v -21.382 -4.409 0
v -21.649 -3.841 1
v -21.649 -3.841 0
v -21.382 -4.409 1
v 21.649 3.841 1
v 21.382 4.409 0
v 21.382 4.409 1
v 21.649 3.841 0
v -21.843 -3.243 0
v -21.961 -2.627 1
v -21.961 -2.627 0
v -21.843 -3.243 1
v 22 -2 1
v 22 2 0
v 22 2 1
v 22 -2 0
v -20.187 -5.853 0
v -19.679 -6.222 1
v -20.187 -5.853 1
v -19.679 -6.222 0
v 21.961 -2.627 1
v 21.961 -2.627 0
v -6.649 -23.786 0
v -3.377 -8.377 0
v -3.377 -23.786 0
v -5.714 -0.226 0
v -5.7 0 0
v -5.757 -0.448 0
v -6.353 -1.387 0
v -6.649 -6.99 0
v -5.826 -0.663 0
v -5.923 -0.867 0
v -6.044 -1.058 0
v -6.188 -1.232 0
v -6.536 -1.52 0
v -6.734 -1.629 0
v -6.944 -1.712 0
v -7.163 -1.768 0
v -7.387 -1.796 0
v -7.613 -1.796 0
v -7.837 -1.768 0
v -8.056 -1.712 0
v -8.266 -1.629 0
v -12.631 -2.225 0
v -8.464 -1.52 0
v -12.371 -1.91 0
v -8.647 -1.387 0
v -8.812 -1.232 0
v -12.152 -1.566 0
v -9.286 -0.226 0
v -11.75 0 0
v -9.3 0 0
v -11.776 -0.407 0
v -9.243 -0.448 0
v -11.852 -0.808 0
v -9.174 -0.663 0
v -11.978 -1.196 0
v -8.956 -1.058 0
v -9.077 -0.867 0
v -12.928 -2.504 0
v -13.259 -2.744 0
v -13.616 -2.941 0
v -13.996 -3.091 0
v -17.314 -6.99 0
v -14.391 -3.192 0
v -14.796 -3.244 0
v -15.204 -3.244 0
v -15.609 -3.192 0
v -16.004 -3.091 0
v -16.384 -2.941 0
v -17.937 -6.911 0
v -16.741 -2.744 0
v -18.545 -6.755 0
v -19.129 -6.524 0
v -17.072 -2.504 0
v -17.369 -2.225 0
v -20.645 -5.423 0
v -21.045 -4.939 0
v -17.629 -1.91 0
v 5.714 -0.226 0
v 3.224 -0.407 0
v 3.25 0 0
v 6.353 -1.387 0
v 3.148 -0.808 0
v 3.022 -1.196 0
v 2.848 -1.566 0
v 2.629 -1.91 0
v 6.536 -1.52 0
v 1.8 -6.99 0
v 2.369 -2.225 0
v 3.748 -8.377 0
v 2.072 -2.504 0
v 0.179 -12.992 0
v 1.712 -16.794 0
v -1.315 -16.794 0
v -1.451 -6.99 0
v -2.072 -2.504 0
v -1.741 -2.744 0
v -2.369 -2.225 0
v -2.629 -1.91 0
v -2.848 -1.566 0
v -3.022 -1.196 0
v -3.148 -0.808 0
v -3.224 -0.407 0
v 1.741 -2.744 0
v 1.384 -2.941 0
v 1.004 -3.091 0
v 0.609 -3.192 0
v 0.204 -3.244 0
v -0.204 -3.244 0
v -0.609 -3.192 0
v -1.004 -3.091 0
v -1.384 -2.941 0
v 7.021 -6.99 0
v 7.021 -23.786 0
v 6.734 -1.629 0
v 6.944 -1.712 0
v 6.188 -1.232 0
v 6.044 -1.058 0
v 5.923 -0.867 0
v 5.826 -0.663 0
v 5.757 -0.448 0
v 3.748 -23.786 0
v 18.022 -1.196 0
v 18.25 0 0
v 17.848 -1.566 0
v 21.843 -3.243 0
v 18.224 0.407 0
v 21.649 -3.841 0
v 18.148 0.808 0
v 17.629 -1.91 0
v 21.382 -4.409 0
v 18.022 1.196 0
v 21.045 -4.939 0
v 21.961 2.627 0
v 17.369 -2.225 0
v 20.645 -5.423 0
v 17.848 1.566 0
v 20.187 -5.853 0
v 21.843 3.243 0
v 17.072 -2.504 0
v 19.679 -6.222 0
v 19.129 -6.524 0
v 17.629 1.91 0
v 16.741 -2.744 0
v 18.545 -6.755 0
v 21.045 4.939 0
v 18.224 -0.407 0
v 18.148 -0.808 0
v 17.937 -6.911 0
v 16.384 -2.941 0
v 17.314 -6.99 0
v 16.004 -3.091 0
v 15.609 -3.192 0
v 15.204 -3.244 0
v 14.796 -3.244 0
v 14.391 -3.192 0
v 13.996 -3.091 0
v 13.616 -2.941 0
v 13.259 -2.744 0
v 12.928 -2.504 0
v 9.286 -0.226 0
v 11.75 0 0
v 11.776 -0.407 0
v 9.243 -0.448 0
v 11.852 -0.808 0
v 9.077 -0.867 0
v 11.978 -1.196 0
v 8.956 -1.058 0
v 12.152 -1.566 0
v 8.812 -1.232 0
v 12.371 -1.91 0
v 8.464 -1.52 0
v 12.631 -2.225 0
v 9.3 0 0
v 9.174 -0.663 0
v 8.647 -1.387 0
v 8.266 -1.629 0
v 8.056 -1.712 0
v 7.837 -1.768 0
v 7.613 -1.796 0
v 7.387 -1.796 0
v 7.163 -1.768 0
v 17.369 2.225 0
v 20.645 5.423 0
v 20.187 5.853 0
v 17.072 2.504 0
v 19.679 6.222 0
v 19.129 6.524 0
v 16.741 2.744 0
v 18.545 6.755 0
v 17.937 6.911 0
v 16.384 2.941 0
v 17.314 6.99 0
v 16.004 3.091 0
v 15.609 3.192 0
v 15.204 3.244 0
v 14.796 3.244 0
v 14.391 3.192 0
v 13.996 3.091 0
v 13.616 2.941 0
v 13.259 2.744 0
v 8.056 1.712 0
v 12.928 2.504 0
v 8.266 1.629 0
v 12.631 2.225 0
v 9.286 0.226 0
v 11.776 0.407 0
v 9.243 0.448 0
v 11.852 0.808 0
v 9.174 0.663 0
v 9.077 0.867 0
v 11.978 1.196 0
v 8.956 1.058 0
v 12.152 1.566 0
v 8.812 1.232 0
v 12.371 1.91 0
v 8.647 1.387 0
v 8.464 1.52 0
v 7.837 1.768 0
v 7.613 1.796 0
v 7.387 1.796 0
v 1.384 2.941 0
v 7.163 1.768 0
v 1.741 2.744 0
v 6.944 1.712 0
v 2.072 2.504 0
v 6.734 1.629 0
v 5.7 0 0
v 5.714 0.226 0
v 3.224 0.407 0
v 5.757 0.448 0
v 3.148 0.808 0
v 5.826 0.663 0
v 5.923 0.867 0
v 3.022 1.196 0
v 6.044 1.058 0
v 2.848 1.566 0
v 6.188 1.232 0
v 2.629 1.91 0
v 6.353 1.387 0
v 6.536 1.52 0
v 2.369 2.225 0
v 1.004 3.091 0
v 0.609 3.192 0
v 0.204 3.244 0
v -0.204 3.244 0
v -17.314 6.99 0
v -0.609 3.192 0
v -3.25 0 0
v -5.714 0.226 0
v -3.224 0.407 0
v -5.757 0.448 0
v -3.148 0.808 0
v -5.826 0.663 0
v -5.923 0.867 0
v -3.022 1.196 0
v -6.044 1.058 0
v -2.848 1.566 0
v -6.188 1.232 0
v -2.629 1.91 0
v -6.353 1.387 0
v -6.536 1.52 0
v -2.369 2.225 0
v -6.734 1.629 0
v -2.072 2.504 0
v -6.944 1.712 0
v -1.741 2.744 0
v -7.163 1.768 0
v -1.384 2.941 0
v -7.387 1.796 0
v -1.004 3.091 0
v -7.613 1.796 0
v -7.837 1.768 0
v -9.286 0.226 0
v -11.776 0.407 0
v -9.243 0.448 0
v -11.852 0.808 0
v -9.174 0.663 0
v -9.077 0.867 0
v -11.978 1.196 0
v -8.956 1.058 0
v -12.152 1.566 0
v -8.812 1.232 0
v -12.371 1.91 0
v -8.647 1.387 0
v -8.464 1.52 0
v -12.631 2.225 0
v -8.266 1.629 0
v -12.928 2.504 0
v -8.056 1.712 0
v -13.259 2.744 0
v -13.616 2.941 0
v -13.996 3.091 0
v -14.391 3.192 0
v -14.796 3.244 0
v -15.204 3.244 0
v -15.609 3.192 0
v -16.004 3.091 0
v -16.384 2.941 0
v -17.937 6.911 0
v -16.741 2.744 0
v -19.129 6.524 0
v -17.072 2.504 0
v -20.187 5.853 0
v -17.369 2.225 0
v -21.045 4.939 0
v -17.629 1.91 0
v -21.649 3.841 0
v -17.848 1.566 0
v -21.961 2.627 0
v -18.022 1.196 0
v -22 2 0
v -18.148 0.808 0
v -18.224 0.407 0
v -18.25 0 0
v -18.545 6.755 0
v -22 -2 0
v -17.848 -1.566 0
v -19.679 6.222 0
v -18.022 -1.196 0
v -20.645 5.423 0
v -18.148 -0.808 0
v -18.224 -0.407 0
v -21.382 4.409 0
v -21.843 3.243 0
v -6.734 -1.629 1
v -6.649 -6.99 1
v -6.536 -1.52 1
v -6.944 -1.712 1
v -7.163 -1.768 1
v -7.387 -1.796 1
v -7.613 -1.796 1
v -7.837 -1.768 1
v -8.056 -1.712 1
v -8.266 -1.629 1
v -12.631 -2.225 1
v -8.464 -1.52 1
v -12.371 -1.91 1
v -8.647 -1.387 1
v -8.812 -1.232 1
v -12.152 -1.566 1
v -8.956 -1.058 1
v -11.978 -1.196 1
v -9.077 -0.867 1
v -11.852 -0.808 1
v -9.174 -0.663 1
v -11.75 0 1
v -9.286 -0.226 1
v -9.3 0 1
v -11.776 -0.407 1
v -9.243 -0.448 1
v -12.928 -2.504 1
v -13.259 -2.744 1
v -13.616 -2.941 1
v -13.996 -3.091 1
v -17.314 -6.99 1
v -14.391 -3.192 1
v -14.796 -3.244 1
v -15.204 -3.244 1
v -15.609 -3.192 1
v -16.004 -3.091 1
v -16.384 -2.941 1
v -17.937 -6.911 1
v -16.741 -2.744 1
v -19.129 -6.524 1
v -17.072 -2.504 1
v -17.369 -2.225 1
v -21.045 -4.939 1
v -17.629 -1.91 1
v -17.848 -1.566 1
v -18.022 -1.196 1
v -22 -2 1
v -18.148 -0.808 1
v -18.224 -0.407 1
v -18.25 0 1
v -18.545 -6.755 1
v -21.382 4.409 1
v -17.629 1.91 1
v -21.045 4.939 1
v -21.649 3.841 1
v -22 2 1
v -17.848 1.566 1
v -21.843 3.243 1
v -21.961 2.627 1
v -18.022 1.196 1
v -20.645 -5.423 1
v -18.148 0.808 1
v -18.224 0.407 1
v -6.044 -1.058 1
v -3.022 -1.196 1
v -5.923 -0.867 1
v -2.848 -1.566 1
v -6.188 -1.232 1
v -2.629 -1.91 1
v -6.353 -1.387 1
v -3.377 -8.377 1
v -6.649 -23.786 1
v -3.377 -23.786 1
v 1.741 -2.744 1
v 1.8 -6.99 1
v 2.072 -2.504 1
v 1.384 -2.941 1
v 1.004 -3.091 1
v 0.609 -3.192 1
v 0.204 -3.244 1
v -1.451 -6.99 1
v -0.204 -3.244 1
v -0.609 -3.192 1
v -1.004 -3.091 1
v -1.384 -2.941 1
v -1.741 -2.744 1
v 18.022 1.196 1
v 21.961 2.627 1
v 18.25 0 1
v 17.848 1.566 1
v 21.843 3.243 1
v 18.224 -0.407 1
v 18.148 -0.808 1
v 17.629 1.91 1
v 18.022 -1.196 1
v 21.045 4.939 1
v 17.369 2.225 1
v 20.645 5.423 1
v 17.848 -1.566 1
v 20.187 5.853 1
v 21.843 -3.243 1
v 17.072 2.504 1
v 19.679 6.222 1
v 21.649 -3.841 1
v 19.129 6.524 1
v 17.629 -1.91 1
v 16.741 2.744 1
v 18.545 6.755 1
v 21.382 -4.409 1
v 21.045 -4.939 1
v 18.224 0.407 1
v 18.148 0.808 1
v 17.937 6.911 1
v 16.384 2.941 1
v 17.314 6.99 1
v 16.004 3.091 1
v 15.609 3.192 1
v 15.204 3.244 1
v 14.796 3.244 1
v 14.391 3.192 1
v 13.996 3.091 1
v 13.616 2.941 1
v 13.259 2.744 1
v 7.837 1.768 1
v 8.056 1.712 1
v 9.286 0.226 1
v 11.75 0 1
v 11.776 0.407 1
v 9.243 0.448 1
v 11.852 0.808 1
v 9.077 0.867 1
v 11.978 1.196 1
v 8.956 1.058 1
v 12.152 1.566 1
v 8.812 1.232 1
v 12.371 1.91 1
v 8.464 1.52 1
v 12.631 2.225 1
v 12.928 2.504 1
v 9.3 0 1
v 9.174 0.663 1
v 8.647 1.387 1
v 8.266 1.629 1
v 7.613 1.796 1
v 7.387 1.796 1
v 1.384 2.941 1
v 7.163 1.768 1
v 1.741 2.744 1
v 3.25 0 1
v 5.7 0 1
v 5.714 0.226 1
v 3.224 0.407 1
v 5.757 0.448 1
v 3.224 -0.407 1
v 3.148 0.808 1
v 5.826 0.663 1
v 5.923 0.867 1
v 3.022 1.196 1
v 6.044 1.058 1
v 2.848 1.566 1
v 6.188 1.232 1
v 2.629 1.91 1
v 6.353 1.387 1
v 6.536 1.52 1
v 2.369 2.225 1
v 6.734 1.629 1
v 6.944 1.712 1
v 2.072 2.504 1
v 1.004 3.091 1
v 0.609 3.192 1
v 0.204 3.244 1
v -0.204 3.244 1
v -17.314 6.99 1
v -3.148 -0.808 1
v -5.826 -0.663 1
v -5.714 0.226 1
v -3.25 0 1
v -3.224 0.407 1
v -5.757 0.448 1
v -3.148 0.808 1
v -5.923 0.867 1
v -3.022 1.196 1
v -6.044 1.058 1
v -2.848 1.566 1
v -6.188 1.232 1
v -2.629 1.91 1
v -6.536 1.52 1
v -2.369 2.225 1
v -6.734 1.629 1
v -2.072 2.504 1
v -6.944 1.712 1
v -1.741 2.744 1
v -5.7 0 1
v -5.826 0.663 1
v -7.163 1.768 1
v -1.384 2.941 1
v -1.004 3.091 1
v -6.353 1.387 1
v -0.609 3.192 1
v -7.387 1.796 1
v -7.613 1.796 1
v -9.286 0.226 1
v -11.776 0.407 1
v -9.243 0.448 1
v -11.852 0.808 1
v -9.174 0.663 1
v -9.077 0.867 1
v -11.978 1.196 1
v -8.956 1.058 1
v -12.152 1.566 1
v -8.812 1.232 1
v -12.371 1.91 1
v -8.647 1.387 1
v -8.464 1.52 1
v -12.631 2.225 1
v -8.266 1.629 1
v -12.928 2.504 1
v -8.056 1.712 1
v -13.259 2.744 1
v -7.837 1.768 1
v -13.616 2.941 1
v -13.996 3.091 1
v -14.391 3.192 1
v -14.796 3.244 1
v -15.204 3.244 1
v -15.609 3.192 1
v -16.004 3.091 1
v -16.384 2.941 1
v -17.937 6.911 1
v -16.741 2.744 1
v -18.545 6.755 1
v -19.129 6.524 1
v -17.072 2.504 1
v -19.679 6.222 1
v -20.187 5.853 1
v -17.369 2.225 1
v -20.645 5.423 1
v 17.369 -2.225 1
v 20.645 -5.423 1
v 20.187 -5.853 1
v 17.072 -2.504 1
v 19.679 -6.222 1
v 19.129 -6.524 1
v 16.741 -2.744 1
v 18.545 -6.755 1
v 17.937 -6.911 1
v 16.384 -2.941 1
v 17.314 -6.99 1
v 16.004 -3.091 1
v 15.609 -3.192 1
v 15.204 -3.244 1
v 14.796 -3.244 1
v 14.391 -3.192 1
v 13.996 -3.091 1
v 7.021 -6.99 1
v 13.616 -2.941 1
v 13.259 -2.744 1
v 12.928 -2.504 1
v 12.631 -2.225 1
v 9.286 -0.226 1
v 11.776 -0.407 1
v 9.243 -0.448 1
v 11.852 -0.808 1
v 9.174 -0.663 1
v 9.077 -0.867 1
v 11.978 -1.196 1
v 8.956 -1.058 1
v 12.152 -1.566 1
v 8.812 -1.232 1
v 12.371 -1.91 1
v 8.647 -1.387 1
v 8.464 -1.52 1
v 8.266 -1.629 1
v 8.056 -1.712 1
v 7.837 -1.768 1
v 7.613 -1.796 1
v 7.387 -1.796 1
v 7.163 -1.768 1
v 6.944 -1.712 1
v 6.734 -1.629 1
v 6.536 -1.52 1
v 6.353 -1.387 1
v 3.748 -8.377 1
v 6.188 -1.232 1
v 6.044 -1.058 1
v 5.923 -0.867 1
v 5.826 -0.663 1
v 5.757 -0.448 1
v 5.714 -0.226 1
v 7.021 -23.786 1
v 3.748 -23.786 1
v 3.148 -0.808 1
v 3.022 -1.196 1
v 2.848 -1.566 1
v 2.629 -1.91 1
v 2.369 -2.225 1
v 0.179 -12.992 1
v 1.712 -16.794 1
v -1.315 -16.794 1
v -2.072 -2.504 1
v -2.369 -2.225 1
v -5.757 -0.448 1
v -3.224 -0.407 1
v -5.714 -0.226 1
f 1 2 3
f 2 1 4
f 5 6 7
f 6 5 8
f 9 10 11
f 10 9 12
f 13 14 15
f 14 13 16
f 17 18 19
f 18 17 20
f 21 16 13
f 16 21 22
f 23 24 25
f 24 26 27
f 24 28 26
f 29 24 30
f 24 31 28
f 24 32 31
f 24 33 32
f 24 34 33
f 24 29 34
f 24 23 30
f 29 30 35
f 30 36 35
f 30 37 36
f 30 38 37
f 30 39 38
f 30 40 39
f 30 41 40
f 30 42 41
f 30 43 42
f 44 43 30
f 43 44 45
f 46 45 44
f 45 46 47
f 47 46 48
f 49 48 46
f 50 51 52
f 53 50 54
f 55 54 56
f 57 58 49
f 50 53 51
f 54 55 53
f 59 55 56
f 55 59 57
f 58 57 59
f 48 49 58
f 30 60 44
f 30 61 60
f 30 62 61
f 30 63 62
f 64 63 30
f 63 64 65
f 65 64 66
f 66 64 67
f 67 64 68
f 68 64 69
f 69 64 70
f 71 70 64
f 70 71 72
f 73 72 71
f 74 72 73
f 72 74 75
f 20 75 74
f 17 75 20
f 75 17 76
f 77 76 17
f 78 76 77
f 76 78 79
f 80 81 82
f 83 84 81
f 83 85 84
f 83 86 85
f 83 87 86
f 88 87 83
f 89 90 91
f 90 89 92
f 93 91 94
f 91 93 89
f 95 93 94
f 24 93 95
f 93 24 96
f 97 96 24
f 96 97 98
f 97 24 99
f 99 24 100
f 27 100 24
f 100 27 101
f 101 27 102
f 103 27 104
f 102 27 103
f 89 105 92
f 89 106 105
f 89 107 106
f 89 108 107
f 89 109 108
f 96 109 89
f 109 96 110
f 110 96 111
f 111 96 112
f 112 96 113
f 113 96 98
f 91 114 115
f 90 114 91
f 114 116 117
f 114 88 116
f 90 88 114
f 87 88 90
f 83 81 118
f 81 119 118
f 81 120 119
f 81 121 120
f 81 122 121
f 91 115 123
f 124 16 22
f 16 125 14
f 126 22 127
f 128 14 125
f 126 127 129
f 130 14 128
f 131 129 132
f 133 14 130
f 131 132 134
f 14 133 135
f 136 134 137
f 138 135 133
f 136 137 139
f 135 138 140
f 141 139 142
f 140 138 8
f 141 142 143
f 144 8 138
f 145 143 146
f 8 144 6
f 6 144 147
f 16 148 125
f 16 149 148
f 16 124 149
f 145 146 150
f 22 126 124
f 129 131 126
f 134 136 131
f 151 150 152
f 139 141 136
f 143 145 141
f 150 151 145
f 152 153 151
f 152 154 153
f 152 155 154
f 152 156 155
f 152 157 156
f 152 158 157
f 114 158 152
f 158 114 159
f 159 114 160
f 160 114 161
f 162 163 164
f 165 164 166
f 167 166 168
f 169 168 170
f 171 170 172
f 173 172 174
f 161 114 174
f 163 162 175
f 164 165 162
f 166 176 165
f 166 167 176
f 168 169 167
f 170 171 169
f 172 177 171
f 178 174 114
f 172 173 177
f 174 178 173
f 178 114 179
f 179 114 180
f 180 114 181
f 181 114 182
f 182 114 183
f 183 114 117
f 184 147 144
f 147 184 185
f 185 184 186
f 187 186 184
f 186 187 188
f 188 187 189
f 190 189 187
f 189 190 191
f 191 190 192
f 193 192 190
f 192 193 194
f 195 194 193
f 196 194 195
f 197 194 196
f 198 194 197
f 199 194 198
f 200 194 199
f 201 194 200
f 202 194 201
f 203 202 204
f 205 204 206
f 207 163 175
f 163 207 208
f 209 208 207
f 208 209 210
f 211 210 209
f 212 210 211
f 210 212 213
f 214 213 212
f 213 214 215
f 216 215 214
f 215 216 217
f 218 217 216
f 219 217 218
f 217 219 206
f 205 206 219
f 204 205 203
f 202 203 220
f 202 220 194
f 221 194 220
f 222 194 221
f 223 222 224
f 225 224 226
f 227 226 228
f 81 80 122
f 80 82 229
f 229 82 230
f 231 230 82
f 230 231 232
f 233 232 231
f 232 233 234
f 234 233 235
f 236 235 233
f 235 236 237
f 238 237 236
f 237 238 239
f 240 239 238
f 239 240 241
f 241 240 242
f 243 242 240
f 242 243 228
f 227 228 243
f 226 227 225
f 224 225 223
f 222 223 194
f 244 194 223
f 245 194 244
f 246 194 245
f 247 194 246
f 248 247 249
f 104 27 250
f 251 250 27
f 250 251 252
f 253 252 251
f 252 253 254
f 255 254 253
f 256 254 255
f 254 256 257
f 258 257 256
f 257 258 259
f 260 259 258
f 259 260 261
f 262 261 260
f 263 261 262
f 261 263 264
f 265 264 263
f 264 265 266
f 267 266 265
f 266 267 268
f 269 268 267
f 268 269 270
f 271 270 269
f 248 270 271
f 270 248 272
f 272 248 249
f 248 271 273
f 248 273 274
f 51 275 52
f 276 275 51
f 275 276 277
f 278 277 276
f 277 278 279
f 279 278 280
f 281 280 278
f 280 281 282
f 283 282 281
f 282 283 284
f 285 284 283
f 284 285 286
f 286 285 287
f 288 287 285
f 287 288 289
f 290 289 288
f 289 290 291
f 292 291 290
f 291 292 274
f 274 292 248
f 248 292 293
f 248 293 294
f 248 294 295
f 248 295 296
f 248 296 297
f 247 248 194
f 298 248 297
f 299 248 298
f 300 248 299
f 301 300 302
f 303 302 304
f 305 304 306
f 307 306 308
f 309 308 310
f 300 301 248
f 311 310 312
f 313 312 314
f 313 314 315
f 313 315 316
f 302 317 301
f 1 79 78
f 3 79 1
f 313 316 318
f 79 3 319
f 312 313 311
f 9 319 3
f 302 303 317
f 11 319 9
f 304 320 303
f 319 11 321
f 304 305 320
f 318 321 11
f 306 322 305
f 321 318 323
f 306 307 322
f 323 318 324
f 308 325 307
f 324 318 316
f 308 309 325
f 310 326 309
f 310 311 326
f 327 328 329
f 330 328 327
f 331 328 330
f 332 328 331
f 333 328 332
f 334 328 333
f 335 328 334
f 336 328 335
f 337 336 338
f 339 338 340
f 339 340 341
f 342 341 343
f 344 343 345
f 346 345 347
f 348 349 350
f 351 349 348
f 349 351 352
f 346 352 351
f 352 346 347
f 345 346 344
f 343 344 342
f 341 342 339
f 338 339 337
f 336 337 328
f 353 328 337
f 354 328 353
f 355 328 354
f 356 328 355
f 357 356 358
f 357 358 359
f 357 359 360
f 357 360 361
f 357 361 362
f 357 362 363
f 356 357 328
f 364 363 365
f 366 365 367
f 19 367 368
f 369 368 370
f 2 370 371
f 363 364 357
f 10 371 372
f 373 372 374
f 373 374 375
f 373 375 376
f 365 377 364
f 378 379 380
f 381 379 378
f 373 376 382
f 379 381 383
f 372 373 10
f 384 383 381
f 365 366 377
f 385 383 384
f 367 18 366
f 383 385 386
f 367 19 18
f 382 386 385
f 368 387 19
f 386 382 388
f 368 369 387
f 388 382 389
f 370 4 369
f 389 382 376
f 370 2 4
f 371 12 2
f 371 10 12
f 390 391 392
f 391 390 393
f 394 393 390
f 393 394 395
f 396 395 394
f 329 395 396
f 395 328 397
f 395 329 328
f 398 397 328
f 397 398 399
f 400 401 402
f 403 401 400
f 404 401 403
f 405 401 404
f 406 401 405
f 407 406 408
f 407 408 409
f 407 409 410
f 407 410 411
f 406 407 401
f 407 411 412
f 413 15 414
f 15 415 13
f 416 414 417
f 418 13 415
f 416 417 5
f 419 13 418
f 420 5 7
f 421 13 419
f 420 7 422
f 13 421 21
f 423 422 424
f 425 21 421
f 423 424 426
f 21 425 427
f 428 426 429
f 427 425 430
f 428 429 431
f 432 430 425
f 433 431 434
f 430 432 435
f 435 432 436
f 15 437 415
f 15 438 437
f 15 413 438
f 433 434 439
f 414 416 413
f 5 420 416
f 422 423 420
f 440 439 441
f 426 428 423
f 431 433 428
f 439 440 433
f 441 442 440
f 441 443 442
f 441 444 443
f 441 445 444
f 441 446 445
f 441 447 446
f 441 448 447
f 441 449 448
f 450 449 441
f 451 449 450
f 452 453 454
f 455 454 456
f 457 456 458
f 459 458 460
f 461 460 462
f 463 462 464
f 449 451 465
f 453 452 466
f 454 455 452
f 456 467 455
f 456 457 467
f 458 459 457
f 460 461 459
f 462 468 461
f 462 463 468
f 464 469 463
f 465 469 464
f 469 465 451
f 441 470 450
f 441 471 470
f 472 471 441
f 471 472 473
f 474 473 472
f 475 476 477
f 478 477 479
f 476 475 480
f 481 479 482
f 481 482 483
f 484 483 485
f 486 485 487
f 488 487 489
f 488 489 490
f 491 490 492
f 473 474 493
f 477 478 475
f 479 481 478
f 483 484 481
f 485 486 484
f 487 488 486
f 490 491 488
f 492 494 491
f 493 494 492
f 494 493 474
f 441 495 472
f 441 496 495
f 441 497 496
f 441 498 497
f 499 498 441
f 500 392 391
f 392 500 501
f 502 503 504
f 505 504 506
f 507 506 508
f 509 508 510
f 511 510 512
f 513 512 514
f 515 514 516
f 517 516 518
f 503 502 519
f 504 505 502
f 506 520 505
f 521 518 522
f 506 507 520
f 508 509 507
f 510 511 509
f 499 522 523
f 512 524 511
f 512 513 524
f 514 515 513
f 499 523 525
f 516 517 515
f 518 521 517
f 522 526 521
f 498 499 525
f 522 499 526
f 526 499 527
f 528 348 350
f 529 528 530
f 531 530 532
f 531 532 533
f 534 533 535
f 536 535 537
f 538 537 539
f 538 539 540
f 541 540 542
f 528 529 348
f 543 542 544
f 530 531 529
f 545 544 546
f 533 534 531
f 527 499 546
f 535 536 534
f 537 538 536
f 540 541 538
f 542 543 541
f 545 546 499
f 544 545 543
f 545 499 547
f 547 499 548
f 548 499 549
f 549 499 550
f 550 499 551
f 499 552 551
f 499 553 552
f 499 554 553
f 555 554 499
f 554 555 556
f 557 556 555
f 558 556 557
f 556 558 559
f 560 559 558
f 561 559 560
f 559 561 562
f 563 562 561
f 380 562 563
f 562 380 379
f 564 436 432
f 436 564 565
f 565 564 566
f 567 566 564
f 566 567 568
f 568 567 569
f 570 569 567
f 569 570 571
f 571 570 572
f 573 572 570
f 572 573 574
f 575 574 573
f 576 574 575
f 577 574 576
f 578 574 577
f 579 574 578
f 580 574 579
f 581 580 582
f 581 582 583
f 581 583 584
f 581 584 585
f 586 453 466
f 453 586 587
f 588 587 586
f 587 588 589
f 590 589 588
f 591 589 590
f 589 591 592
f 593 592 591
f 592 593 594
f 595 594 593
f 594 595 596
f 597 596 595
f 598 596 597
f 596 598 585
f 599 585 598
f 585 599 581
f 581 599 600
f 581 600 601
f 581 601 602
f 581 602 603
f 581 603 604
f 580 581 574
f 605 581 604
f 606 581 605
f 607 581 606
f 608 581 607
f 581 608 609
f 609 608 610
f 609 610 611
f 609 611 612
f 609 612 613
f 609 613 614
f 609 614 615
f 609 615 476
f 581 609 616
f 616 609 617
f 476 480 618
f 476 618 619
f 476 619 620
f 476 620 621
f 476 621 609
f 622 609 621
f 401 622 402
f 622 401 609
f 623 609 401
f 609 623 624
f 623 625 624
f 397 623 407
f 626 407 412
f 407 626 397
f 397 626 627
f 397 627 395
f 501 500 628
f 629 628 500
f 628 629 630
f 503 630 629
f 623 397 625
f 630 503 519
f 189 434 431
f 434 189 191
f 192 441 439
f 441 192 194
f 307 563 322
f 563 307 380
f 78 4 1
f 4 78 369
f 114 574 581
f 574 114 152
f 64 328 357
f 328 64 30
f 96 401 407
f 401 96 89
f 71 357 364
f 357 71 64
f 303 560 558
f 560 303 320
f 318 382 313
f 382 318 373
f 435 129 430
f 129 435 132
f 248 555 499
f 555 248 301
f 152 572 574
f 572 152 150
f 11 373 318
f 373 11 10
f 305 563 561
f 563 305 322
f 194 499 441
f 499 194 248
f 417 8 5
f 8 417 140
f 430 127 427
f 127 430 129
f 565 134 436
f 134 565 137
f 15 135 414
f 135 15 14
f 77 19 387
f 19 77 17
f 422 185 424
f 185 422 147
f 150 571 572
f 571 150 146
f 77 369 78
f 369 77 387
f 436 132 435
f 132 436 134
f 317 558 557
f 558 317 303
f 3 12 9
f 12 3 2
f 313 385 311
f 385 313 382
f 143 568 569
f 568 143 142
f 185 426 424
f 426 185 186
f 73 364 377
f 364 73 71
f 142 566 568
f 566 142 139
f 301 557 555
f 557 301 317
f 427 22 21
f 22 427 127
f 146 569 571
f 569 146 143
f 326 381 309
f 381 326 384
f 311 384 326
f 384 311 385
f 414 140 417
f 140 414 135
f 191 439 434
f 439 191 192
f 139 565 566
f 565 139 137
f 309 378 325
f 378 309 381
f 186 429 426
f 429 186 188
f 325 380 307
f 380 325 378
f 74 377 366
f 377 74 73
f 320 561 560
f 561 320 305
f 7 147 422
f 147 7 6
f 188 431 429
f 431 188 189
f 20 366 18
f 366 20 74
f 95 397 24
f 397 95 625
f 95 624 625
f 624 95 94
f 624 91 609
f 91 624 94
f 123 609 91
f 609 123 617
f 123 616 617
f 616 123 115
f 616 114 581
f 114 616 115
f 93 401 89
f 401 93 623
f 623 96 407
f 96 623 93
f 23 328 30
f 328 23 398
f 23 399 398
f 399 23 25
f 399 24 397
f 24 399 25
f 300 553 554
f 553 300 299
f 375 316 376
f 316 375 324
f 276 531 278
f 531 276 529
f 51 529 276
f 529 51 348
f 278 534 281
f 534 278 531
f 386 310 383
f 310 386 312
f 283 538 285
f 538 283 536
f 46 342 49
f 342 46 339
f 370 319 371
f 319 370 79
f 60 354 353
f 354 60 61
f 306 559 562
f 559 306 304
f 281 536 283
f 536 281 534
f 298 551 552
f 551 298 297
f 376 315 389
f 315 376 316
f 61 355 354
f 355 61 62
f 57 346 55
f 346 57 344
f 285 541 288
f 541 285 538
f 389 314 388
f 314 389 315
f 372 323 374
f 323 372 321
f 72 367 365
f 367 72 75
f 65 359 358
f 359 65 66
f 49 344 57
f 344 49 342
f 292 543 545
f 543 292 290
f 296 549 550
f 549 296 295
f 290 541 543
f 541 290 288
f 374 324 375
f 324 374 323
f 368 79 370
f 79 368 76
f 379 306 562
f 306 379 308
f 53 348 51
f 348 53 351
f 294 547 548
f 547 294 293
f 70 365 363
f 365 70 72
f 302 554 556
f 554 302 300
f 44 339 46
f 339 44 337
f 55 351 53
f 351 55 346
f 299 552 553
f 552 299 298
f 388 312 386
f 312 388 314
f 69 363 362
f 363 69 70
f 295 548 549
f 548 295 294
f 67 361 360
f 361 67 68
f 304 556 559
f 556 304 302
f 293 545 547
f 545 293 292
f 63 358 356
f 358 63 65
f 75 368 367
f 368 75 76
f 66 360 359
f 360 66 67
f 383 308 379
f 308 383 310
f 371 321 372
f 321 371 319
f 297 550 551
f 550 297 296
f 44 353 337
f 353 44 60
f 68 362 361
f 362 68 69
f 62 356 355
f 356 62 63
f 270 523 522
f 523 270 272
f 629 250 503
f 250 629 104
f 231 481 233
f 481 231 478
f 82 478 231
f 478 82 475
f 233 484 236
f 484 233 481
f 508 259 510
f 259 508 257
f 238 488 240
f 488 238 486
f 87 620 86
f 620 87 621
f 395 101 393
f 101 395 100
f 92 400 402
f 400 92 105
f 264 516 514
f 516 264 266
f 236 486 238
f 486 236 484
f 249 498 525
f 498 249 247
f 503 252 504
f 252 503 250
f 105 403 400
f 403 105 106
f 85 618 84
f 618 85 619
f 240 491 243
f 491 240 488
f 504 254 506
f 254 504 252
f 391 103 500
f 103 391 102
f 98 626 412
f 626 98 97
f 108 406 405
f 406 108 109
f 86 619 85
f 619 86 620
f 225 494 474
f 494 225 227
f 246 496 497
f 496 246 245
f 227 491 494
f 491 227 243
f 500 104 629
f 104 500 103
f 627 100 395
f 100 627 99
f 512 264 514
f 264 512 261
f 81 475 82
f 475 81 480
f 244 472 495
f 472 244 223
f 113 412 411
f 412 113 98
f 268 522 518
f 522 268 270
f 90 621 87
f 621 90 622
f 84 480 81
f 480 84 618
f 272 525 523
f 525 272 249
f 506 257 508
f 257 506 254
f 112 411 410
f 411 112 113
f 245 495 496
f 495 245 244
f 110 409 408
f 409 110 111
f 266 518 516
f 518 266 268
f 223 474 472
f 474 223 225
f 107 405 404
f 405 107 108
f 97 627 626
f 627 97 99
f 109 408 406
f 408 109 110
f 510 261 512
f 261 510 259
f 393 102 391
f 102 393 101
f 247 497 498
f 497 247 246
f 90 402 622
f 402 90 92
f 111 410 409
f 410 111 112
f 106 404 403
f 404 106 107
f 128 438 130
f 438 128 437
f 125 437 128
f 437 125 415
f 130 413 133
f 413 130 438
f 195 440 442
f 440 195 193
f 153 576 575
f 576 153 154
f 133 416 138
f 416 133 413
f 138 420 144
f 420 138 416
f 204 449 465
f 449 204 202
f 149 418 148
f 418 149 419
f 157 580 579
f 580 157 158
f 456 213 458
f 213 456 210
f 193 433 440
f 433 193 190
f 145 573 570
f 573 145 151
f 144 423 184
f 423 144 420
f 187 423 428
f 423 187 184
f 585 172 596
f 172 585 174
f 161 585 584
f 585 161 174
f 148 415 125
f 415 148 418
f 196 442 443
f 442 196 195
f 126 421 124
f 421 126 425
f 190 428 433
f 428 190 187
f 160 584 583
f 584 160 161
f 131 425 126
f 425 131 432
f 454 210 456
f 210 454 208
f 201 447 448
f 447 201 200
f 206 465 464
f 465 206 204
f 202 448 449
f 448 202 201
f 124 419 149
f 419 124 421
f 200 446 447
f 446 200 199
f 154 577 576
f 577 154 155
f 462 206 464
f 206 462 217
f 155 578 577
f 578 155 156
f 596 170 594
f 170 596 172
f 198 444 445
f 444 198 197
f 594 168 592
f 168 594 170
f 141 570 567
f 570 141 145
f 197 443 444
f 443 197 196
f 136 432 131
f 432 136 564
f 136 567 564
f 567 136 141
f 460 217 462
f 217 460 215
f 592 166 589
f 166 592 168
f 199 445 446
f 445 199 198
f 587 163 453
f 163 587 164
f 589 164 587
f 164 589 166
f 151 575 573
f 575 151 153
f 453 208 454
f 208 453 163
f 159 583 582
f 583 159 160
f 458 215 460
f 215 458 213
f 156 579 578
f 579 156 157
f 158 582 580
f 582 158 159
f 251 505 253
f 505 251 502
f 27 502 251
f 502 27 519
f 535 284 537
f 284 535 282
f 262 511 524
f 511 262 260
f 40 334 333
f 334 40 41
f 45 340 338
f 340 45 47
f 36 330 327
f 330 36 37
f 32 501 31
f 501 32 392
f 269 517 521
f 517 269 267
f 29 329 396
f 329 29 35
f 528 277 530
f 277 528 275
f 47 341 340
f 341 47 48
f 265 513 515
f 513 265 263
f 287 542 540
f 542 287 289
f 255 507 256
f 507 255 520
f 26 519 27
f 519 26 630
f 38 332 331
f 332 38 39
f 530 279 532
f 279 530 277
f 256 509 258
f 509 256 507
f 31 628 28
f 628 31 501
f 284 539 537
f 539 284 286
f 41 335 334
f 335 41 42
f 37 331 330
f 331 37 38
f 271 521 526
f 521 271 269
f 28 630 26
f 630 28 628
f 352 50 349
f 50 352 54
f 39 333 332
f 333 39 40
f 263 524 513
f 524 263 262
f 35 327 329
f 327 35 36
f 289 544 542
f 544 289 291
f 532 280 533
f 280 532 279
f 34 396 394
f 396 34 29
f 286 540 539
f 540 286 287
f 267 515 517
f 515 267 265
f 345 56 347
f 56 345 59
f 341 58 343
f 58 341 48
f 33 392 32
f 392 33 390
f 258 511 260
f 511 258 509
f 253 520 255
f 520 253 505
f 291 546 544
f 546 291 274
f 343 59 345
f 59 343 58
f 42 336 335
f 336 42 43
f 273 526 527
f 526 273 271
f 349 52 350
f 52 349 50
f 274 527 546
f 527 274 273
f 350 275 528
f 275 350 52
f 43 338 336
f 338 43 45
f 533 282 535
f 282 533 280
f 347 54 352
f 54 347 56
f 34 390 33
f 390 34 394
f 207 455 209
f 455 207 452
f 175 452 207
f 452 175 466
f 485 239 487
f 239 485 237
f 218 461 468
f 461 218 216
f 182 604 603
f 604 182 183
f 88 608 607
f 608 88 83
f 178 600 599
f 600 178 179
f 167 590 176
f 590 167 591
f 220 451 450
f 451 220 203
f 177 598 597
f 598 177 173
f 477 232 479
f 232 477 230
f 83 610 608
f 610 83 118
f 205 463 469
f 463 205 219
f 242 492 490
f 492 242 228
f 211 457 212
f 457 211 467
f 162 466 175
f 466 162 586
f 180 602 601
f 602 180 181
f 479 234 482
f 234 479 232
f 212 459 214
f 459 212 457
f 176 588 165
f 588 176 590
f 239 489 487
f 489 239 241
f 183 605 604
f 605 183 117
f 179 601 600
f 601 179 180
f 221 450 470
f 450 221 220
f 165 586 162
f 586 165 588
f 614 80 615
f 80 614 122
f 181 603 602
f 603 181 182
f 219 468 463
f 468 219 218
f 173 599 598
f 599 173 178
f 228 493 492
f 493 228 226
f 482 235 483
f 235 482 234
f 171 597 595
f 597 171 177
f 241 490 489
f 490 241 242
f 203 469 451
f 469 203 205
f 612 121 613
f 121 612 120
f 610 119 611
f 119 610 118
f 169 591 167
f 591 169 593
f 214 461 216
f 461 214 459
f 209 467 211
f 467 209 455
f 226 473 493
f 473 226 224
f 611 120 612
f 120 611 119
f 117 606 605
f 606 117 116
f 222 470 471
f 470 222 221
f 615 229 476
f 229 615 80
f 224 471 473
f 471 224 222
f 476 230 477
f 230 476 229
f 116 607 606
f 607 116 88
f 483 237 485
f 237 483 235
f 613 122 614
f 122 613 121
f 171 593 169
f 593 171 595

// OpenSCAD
$fn = 50;


difference() {
	union() {
		hull() {
			translate(v = [-17.0000000000, 2.0000000000, 0]) {
				cylinder(h = 1, r = 5);
			}
			translate(v = [17.0000000000, 2.0000000000, 0]) {
				cylinder(h = 1, r = 5);
			}
			translate(v = [-17.0000000000, -2.0000000000, 0]) {
				cylinder(h = 1, r = 5);
			}
			translate(v = [17.0000000000, -2.0000000000, 0]) {
				cylinder(h = 1, r = 5);
			}
		}
		translate(v = [0, -5, 0]) {
			linear_extrude(height = 1) {
				text(font = "DejaVu Sans Mono:style=Bold", halign = "center", size = 19.0000000000, text = "M", valign = "top");
			}
		}
	}
	union() {
		translate(v = [-15.0000000000, 0.0000000000, 0]) {
			translate(v = [0, 0, -100]) {
				cylinder(h = 200, r = 3.2500000000);
			}
		}
		translate(v = [0, 0, -100]) {
			cylinder(h = 200, r = 3.2500000000);
		}
		translate(v = [15.0000000000, 0.0000000000, 0]) {
			translate(v = [0, 0, -100]) {
				cylinder(h = 200, r = 3.2500000000);
			}
		}
		translate(v = [-15.0000000000, 0.0000000000, 0]) {
			translate(v = [0, 0, -100]) {
				cylinder(h = 200, r = 1.8000000000);
			}
		}
		translate(v = [-7.5000000000, 0.0000000000, 0]) {
			translate(v = [0, 0, -100]) {
				cylinder(h = 200, r = 1.8000000000);
			}
		}
		translate(v = [0, 0, -100]) {
			cylinder(h = 200, r = 1.8000000000);
		}
		translate(v = [7.5000000000, 0.0000000000, 0]) {
			translate(v = [0, 0, -100]) {
				cylinder(h = 200, r = 1.8000000000);
			}
		}
		translate(v = [15.0000000000, 0.0000000000, 0]) {
			translate(v = [0, 0, -100]) {
				cylinder(h = 200, r = 1.8000000000);
			}
		}
	}
}
